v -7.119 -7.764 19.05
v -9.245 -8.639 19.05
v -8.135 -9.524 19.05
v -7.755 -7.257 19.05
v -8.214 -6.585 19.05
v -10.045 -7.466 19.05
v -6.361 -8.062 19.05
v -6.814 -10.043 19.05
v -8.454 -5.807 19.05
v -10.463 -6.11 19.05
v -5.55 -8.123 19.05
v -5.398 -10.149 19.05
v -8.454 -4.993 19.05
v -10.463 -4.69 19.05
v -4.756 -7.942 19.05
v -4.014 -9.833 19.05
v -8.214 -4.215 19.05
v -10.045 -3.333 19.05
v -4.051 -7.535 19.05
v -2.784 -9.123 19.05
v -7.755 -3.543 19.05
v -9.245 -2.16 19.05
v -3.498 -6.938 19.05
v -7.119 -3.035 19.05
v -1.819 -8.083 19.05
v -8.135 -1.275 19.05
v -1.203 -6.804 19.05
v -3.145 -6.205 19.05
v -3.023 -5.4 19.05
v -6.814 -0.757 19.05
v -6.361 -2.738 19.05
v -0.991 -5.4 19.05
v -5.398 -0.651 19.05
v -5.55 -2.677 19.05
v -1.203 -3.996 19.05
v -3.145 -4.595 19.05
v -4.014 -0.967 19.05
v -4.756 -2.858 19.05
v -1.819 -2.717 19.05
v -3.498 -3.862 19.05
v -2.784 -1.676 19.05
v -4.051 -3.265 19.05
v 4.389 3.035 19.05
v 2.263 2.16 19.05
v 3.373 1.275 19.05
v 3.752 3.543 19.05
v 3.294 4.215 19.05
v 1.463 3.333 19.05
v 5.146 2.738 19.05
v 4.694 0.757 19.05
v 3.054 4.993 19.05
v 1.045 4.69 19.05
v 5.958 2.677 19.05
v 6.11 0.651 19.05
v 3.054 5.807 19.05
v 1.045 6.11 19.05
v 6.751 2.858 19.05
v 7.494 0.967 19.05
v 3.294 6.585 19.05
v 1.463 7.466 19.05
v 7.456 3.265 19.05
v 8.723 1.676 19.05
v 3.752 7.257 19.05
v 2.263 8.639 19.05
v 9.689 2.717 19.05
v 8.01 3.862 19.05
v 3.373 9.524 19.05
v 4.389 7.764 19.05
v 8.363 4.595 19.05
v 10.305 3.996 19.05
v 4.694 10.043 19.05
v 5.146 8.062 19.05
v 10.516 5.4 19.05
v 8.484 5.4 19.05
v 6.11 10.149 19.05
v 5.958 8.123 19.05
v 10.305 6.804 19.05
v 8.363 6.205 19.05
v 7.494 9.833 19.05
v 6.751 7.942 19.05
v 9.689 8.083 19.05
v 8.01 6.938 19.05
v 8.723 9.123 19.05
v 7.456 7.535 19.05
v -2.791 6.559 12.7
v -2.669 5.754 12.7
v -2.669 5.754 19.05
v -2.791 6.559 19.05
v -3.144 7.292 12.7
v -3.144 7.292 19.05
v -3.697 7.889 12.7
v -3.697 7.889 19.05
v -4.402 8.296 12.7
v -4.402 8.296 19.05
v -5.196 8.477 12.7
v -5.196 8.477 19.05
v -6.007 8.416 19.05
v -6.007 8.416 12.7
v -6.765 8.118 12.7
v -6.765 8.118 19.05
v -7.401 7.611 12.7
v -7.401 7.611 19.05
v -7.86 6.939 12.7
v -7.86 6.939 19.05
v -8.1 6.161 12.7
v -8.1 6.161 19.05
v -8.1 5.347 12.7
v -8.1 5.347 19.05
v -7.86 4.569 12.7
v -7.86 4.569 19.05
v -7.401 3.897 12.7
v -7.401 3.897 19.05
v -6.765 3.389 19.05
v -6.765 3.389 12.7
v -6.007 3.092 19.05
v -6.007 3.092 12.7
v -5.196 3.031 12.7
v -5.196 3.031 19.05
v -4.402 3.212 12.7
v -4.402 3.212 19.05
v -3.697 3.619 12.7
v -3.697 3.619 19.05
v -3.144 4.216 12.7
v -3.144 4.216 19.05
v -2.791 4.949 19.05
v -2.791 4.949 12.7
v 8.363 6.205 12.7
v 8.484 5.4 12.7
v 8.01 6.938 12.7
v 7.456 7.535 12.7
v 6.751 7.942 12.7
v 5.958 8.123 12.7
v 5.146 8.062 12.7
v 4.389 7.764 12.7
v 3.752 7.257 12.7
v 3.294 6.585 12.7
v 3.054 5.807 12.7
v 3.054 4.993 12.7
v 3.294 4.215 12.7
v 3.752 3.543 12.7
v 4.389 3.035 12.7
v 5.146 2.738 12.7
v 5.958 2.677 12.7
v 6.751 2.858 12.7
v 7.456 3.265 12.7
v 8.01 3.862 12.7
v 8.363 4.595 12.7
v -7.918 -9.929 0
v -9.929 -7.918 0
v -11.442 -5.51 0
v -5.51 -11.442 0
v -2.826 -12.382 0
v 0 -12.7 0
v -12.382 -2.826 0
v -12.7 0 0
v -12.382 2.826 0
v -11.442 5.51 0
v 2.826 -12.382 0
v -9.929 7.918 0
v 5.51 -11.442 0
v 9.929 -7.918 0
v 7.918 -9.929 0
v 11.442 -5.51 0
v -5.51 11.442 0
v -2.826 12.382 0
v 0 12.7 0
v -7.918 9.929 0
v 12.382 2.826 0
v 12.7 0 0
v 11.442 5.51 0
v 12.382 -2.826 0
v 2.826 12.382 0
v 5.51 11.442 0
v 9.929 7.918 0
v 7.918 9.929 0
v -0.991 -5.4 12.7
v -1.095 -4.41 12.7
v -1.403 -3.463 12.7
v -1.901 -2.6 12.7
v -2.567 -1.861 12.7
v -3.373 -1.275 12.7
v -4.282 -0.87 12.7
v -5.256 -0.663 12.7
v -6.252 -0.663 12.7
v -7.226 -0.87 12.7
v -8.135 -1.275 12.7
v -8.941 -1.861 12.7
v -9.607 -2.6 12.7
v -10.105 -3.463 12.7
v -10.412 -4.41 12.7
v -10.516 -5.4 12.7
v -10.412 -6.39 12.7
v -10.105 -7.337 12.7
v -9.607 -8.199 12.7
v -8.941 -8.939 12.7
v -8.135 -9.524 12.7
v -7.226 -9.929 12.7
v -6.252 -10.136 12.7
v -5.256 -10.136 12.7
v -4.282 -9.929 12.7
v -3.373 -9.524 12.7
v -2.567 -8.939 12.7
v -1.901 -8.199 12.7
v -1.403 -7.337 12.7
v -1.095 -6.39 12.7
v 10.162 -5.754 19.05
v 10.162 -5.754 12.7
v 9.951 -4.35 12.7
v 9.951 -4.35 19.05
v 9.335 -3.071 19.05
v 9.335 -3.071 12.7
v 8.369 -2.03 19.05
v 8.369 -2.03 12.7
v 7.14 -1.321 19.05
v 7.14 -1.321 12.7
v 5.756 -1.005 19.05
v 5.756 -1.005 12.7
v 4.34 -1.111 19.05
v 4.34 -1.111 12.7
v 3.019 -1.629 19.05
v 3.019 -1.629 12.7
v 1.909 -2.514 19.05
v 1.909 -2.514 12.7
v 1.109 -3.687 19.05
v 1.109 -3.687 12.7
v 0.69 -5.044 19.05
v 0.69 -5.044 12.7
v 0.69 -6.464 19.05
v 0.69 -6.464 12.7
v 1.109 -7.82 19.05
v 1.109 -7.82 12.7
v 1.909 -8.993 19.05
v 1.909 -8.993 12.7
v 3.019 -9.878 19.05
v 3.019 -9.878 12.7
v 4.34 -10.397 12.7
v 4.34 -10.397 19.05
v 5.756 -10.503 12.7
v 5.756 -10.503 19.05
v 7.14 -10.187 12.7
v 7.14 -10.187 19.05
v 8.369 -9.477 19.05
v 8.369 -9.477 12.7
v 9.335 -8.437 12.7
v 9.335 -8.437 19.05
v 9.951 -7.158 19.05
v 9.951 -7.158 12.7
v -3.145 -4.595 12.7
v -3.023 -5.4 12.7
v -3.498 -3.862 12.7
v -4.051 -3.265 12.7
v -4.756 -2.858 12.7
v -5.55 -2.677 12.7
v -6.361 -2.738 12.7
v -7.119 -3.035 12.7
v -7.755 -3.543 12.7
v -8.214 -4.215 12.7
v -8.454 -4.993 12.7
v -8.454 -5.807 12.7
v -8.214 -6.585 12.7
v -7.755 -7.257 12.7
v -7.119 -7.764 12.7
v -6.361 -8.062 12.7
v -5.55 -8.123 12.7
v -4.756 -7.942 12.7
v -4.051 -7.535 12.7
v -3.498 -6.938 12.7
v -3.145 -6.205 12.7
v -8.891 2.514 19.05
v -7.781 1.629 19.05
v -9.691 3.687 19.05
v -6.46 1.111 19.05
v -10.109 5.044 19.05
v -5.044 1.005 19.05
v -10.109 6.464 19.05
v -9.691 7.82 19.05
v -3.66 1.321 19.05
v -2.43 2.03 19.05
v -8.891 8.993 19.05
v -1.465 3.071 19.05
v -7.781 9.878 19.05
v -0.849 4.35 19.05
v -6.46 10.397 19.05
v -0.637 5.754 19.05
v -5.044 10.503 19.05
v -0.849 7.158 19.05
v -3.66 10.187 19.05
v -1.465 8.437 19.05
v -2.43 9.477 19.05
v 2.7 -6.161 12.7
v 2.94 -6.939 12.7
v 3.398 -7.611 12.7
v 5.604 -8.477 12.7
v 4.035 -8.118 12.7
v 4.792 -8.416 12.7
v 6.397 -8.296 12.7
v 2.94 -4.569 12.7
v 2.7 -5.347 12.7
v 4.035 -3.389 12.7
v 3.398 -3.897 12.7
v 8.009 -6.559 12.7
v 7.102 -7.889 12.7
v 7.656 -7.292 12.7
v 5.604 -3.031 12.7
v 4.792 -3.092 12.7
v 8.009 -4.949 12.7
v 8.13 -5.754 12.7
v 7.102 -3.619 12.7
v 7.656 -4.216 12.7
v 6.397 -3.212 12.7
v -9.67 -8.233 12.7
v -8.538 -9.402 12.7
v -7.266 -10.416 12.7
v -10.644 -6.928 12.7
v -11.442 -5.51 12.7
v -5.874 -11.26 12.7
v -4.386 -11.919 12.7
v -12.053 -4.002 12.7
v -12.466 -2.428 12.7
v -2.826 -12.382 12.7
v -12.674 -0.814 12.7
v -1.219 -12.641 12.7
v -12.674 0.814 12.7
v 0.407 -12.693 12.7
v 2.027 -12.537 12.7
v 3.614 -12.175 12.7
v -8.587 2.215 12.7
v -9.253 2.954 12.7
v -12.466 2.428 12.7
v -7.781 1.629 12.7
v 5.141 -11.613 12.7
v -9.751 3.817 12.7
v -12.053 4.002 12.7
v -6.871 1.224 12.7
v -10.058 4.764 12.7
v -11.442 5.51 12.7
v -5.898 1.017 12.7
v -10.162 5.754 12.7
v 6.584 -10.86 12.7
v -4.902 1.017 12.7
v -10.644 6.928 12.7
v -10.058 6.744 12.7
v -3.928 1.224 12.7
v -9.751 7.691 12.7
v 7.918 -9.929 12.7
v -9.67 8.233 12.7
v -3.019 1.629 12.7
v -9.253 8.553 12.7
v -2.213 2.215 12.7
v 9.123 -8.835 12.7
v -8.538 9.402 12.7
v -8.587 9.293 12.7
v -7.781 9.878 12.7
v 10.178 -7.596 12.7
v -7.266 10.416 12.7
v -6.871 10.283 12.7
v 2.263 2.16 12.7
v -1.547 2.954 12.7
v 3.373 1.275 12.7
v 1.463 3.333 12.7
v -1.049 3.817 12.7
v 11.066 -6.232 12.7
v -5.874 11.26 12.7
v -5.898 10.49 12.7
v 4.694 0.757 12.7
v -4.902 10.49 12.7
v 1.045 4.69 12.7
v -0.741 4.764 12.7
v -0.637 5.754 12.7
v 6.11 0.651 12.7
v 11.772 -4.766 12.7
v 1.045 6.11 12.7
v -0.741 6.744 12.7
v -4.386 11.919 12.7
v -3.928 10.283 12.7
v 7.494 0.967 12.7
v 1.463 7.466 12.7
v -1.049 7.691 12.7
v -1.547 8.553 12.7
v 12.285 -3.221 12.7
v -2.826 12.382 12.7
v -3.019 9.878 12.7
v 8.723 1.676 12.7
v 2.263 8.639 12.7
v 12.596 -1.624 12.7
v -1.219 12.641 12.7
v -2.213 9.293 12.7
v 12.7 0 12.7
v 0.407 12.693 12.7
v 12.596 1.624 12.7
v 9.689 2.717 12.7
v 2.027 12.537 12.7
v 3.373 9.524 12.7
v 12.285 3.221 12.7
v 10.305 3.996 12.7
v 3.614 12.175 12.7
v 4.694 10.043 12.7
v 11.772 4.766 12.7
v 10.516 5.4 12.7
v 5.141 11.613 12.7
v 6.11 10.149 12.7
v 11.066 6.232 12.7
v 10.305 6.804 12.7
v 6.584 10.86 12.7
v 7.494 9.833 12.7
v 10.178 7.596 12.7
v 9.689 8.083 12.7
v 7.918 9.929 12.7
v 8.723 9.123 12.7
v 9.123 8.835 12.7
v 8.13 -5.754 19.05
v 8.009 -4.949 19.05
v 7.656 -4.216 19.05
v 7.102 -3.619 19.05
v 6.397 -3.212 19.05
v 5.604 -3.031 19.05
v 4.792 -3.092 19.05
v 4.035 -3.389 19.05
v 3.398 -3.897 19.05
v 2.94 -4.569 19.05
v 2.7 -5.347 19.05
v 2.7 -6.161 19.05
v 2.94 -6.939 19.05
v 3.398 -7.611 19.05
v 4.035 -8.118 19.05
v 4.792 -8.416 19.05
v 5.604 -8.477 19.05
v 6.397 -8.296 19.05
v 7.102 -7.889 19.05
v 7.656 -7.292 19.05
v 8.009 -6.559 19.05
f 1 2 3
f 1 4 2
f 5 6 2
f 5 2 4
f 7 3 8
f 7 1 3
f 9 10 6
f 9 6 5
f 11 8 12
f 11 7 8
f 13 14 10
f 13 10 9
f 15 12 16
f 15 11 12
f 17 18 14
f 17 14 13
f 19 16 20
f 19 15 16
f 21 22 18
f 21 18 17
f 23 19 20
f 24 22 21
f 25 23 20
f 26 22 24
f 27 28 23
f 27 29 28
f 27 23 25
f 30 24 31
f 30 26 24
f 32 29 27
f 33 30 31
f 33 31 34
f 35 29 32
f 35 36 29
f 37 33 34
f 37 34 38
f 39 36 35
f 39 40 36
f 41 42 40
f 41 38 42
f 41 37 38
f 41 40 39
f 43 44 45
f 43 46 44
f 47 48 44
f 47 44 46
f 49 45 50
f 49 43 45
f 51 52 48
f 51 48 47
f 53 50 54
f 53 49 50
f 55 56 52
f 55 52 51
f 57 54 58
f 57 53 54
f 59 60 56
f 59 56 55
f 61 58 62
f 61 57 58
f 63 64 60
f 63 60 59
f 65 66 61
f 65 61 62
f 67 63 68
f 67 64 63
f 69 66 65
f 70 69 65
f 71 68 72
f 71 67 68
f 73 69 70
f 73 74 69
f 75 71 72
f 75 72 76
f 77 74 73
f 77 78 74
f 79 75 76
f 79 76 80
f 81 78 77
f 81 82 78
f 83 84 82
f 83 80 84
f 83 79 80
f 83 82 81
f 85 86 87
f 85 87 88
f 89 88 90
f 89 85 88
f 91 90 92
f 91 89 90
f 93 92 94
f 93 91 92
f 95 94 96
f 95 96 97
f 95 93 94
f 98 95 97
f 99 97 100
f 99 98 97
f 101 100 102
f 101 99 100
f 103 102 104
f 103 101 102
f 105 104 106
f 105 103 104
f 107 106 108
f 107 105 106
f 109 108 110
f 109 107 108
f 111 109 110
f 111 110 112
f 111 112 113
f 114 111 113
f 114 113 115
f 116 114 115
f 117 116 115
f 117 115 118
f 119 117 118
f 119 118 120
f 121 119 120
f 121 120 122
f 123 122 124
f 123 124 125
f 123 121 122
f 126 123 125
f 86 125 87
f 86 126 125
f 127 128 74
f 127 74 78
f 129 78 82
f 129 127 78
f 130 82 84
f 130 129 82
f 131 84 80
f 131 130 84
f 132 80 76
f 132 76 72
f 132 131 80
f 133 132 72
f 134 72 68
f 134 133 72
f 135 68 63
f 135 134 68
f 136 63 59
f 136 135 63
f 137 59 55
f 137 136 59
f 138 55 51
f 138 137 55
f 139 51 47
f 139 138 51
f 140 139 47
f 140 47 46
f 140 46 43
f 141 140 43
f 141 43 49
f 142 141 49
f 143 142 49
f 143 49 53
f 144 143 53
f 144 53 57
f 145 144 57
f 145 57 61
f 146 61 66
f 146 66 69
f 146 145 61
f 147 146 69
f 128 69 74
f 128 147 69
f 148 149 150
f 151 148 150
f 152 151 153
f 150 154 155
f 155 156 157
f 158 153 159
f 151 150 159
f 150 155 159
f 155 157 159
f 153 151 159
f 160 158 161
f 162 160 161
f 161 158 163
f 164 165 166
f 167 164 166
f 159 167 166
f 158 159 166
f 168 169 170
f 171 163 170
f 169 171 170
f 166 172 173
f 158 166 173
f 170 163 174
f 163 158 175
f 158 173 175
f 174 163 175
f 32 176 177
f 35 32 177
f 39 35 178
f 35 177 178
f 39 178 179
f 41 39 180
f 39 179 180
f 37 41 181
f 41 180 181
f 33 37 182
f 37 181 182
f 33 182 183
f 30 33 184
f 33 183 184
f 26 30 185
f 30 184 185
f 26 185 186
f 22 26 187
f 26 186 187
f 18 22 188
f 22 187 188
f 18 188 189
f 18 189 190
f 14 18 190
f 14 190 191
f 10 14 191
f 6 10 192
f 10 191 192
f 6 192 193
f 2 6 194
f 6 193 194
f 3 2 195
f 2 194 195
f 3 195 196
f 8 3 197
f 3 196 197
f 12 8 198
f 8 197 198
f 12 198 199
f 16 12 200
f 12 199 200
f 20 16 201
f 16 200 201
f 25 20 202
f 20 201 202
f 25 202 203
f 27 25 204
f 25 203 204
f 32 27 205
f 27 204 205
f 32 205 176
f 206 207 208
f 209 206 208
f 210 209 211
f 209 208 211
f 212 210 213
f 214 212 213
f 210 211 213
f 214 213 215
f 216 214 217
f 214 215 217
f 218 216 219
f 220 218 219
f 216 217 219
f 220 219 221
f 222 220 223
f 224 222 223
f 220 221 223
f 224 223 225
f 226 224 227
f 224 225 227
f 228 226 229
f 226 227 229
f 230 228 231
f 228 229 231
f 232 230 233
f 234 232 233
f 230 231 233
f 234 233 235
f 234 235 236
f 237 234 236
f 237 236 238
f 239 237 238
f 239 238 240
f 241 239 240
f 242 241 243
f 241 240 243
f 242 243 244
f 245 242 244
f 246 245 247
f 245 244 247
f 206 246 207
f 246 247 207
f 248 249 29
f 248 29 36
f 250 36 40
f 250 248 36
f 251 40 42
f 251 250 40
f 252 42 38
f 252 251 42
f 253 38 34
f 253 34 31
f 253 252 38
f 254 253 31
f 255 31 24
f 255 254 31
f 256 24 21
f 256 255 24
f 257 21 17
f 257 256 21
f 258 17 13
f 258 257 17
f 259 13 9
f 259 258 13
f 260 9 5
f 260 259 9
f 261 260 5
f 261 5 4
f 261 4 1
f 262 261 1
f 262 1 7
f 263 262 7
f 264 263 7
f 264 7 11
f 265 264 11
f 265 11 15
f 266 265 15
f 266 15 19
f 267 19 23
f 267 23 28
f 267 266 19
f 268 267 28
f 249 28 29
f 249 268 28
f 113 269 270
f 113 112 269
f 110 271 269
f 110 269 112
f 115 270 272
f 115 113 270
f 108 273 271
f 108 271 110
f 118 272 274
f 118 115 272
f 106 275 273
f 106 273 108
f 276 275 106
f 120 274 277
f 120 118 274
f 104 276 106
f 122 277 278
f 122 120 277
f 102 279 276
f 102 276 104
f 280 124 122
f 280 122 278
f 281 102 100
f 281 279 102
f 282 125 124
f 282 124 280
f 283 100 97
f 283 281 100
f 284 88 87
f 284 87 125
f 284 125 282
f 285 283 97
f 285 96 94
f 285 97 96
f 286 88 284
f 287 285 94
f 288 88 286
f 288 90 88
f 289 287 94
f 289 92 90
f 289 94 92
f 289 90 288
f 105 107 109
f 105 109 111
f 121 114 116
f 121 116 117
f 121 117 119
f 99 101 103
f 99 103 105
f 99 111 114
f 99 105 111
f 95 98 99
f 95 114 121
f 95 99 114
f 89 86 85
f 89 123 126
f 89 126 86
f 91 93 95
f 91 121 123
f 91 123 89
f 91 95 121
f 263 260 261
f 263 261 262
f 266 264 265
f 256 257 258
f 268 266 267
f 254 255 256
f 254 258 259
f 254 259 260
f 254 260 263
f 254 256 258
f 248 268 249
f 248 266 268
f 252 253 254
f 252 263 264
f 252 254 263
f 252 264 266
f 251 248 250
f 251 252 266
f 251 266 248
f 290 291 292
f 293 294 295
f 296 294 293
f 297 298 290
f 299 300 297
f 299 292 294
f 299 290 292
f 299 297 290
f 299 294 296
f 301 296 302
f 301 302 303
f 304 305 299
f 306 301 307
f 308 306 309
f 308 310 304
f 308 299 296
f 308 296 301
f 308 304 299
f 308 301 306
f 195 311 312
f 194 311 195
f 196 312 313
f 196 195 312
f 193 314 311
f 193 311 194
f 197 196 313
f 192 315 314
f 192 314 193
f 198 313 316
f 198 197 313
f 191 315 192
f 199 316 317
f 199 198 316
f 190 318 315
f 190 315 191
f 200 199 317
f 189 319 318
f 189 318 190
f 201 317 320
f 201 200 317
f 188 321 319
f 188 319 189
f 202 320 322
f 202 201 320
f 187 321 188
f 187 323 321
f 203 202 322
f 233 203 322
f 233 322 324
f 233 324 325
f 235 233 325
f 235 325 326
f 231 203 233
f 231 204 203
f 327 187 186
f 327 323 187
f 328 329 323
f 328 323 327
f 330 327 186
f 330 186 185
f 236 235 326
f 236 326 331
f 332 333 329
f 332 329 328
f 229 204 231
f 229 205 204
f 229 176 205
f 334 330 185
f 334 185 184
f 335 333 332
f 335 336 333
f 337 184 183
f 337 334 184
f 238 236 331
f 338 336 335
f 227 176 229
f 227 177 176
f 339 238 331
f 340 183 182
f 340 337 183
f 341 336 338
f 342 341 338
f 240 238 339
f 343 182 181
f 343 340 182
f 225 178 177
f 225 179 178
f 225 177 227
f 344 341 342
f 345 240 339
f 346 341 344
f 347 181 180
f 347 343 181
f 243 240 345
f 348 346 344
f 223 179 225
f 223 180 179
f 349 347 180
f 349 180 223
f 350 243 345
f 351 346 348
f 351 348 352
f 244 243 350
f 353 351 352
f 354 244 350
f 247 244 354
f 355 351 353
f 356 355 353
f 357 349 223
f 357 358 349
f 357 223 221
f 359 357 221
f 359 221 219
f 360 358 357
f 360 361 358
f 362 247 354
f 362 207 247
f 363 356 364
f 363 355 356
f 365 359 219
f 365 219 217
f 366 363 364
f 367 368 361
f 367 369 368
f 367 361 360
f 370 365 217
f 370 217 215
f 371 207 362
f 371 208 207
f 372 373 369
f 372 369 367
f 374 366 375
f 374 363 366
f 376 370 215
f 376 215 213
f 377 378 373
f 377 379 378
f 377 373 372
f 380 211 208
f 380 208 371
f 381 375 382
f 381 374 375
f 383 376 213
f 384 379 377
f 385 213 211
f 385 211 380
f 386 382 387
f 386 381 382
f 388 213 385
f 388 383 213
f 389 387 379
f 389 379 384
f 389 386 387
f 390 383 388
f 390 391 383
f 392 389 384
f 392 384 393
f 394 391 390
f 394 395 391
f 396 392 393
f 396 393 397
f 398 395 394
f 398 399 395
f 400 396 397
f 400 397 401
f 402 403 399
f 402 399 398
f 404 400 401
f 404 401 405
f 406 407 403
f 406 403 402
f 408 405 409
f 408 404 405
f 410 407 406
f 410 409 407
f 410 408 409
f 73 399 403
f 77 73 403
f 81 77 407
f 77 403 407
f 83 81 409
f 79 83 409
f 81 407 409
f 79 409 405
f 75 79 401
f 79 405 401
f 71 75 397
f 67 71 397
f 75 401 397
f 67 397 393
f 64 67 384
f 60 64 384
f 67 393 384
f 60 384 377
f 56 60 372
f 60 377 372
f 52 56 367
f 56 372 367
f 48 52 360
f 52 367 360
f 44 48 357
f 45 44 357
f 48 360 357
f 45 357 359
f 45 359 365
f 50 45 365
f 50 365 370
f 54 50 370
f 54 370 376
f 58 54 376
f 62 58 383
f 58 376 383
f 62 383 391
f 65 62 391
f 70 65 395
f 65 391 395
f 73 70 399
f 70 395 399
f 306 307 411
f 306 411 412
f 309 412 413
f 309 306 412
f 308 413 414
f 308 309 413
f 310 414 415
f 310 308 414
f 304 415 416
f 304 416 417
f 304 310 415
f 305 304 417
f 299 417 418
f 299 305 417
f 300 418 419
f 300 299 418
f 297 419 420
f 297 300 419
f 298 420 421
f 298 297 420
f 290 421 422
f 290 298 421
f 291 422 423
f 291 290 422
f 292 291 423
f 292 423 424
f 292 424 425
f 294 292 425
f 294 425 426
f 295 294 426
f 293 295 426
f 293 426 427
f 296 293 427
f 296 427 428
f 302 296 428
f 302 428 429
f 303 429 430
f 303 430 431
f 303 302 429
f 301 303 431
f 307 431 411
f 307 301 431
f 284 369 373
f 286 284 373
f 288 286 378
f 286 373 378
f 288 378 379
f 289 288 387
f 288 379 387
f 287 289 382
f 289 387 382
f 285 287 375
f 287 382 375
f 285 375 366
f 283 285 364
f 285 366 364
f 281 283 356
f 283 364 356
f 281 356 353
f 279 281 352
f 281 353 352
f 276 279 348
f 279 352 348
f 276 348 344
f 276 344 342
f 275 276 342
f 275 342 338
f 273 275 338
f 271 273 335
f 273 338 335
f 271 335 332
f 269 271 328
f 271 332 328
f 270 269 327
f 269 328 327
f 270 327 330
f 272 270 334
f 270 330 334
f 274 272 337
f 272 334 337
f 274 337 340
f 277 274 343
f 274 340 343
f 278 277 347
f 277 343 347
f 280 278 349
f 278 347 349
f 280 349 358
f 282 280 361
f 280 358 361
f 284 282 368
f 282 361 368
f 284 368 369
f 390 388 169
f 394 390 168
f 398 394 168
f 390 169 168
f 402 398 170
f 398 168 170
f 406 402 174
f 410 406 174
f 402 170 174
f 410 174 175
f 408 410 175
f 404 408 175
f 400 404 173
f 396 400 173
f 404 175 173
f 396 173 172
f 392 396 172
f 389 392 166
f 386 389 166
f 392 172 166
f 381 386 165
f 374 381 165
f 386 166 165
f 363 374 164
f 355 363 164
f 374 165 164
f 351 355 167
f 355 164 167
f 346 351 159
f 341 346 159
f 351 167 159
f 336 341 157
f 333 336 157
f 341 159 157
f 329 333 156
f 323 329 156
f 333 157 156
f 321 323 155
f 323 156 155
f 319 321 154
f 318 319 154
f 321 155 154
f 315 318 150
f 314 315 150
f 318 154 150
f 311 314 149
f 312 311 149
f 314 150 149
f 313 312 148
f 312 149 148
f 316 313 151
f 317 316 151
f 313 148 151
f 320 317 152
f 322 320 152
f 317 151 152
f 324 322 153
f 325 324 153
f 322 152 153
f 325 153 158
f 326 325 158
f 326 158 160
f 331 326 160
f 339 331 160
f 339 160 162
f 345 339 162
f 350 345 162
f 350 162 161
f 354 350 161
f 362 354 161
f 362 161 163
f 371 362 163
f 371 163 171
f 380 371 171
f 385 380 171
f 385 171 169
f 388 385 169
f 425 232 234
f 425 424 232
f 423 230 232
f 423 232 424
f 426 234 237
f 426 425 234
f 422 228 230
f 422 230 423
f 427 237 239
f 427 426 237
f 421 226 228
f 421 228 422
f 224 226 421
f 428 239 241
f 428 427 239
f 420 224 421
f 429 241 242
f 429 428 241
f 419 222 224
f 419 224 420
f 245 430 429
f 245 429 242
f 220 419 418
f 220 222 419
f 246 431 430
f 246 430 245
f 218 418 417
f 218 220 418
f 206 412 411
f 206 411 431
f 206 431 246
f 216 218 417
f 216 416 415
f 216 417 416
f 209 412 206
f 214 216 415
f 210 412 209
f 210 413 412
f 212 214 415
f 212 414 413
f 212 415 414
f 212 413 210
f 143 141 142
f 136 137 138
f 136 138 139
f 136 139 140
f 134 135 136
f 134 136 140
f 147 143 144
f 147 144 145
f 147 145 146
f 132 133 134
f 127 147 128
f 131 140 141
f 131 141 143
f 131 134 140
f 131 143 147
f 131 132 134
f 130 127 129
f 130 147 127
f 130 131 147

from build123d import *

# Parameters (mm, degrees)
F0_R     = 12.7
F1_DEPTH = 12.7
F3_R     = 4.7625
F3_R_2   = 2.7305
F4_DEPTH = 6.35


with BuildPart() as f1:
    # F0 (on Top) → F1 (new body)
    with BuildSketch(Plane.XY):
        Circle(F0_R)
    extrude(amount=F1_DEPTH)

    # F3 (on offset) → F4 (join)
    with BuildSketch(Plane.XY.offset(12.7)):
        with Locations((-5.399791, 5.753814)):
            Circle(F3_R)
        with Locations((-5.399791, 5.753814)):
            Circle(F3_R_2, mode=Mode.SUBTRACT)
        with Locations((-5.753814, -5.399791)):
            Circle(F3_R)
        with Locations((-5.753814, -5.399791)):
            Circle(F3_R_2, mode=Mode.SUBTRACT)
        with Locations((5.399791, -5.753814)):
            Circle(F3_R)
        with Locations((5.399791, -5.753814)):
            Circle(F3_R_2, mode=Mode.SUBTRACT)
        with Locations((5.753814, 5.399791)):
            Circle(F3_R)
        with Locations((5.753814, 5.399791)):
            Circle(F3_R_2, mode=Mode.SUBTRACT)
    extrude(amount=F4_DEPTH)


solid = f1.part
